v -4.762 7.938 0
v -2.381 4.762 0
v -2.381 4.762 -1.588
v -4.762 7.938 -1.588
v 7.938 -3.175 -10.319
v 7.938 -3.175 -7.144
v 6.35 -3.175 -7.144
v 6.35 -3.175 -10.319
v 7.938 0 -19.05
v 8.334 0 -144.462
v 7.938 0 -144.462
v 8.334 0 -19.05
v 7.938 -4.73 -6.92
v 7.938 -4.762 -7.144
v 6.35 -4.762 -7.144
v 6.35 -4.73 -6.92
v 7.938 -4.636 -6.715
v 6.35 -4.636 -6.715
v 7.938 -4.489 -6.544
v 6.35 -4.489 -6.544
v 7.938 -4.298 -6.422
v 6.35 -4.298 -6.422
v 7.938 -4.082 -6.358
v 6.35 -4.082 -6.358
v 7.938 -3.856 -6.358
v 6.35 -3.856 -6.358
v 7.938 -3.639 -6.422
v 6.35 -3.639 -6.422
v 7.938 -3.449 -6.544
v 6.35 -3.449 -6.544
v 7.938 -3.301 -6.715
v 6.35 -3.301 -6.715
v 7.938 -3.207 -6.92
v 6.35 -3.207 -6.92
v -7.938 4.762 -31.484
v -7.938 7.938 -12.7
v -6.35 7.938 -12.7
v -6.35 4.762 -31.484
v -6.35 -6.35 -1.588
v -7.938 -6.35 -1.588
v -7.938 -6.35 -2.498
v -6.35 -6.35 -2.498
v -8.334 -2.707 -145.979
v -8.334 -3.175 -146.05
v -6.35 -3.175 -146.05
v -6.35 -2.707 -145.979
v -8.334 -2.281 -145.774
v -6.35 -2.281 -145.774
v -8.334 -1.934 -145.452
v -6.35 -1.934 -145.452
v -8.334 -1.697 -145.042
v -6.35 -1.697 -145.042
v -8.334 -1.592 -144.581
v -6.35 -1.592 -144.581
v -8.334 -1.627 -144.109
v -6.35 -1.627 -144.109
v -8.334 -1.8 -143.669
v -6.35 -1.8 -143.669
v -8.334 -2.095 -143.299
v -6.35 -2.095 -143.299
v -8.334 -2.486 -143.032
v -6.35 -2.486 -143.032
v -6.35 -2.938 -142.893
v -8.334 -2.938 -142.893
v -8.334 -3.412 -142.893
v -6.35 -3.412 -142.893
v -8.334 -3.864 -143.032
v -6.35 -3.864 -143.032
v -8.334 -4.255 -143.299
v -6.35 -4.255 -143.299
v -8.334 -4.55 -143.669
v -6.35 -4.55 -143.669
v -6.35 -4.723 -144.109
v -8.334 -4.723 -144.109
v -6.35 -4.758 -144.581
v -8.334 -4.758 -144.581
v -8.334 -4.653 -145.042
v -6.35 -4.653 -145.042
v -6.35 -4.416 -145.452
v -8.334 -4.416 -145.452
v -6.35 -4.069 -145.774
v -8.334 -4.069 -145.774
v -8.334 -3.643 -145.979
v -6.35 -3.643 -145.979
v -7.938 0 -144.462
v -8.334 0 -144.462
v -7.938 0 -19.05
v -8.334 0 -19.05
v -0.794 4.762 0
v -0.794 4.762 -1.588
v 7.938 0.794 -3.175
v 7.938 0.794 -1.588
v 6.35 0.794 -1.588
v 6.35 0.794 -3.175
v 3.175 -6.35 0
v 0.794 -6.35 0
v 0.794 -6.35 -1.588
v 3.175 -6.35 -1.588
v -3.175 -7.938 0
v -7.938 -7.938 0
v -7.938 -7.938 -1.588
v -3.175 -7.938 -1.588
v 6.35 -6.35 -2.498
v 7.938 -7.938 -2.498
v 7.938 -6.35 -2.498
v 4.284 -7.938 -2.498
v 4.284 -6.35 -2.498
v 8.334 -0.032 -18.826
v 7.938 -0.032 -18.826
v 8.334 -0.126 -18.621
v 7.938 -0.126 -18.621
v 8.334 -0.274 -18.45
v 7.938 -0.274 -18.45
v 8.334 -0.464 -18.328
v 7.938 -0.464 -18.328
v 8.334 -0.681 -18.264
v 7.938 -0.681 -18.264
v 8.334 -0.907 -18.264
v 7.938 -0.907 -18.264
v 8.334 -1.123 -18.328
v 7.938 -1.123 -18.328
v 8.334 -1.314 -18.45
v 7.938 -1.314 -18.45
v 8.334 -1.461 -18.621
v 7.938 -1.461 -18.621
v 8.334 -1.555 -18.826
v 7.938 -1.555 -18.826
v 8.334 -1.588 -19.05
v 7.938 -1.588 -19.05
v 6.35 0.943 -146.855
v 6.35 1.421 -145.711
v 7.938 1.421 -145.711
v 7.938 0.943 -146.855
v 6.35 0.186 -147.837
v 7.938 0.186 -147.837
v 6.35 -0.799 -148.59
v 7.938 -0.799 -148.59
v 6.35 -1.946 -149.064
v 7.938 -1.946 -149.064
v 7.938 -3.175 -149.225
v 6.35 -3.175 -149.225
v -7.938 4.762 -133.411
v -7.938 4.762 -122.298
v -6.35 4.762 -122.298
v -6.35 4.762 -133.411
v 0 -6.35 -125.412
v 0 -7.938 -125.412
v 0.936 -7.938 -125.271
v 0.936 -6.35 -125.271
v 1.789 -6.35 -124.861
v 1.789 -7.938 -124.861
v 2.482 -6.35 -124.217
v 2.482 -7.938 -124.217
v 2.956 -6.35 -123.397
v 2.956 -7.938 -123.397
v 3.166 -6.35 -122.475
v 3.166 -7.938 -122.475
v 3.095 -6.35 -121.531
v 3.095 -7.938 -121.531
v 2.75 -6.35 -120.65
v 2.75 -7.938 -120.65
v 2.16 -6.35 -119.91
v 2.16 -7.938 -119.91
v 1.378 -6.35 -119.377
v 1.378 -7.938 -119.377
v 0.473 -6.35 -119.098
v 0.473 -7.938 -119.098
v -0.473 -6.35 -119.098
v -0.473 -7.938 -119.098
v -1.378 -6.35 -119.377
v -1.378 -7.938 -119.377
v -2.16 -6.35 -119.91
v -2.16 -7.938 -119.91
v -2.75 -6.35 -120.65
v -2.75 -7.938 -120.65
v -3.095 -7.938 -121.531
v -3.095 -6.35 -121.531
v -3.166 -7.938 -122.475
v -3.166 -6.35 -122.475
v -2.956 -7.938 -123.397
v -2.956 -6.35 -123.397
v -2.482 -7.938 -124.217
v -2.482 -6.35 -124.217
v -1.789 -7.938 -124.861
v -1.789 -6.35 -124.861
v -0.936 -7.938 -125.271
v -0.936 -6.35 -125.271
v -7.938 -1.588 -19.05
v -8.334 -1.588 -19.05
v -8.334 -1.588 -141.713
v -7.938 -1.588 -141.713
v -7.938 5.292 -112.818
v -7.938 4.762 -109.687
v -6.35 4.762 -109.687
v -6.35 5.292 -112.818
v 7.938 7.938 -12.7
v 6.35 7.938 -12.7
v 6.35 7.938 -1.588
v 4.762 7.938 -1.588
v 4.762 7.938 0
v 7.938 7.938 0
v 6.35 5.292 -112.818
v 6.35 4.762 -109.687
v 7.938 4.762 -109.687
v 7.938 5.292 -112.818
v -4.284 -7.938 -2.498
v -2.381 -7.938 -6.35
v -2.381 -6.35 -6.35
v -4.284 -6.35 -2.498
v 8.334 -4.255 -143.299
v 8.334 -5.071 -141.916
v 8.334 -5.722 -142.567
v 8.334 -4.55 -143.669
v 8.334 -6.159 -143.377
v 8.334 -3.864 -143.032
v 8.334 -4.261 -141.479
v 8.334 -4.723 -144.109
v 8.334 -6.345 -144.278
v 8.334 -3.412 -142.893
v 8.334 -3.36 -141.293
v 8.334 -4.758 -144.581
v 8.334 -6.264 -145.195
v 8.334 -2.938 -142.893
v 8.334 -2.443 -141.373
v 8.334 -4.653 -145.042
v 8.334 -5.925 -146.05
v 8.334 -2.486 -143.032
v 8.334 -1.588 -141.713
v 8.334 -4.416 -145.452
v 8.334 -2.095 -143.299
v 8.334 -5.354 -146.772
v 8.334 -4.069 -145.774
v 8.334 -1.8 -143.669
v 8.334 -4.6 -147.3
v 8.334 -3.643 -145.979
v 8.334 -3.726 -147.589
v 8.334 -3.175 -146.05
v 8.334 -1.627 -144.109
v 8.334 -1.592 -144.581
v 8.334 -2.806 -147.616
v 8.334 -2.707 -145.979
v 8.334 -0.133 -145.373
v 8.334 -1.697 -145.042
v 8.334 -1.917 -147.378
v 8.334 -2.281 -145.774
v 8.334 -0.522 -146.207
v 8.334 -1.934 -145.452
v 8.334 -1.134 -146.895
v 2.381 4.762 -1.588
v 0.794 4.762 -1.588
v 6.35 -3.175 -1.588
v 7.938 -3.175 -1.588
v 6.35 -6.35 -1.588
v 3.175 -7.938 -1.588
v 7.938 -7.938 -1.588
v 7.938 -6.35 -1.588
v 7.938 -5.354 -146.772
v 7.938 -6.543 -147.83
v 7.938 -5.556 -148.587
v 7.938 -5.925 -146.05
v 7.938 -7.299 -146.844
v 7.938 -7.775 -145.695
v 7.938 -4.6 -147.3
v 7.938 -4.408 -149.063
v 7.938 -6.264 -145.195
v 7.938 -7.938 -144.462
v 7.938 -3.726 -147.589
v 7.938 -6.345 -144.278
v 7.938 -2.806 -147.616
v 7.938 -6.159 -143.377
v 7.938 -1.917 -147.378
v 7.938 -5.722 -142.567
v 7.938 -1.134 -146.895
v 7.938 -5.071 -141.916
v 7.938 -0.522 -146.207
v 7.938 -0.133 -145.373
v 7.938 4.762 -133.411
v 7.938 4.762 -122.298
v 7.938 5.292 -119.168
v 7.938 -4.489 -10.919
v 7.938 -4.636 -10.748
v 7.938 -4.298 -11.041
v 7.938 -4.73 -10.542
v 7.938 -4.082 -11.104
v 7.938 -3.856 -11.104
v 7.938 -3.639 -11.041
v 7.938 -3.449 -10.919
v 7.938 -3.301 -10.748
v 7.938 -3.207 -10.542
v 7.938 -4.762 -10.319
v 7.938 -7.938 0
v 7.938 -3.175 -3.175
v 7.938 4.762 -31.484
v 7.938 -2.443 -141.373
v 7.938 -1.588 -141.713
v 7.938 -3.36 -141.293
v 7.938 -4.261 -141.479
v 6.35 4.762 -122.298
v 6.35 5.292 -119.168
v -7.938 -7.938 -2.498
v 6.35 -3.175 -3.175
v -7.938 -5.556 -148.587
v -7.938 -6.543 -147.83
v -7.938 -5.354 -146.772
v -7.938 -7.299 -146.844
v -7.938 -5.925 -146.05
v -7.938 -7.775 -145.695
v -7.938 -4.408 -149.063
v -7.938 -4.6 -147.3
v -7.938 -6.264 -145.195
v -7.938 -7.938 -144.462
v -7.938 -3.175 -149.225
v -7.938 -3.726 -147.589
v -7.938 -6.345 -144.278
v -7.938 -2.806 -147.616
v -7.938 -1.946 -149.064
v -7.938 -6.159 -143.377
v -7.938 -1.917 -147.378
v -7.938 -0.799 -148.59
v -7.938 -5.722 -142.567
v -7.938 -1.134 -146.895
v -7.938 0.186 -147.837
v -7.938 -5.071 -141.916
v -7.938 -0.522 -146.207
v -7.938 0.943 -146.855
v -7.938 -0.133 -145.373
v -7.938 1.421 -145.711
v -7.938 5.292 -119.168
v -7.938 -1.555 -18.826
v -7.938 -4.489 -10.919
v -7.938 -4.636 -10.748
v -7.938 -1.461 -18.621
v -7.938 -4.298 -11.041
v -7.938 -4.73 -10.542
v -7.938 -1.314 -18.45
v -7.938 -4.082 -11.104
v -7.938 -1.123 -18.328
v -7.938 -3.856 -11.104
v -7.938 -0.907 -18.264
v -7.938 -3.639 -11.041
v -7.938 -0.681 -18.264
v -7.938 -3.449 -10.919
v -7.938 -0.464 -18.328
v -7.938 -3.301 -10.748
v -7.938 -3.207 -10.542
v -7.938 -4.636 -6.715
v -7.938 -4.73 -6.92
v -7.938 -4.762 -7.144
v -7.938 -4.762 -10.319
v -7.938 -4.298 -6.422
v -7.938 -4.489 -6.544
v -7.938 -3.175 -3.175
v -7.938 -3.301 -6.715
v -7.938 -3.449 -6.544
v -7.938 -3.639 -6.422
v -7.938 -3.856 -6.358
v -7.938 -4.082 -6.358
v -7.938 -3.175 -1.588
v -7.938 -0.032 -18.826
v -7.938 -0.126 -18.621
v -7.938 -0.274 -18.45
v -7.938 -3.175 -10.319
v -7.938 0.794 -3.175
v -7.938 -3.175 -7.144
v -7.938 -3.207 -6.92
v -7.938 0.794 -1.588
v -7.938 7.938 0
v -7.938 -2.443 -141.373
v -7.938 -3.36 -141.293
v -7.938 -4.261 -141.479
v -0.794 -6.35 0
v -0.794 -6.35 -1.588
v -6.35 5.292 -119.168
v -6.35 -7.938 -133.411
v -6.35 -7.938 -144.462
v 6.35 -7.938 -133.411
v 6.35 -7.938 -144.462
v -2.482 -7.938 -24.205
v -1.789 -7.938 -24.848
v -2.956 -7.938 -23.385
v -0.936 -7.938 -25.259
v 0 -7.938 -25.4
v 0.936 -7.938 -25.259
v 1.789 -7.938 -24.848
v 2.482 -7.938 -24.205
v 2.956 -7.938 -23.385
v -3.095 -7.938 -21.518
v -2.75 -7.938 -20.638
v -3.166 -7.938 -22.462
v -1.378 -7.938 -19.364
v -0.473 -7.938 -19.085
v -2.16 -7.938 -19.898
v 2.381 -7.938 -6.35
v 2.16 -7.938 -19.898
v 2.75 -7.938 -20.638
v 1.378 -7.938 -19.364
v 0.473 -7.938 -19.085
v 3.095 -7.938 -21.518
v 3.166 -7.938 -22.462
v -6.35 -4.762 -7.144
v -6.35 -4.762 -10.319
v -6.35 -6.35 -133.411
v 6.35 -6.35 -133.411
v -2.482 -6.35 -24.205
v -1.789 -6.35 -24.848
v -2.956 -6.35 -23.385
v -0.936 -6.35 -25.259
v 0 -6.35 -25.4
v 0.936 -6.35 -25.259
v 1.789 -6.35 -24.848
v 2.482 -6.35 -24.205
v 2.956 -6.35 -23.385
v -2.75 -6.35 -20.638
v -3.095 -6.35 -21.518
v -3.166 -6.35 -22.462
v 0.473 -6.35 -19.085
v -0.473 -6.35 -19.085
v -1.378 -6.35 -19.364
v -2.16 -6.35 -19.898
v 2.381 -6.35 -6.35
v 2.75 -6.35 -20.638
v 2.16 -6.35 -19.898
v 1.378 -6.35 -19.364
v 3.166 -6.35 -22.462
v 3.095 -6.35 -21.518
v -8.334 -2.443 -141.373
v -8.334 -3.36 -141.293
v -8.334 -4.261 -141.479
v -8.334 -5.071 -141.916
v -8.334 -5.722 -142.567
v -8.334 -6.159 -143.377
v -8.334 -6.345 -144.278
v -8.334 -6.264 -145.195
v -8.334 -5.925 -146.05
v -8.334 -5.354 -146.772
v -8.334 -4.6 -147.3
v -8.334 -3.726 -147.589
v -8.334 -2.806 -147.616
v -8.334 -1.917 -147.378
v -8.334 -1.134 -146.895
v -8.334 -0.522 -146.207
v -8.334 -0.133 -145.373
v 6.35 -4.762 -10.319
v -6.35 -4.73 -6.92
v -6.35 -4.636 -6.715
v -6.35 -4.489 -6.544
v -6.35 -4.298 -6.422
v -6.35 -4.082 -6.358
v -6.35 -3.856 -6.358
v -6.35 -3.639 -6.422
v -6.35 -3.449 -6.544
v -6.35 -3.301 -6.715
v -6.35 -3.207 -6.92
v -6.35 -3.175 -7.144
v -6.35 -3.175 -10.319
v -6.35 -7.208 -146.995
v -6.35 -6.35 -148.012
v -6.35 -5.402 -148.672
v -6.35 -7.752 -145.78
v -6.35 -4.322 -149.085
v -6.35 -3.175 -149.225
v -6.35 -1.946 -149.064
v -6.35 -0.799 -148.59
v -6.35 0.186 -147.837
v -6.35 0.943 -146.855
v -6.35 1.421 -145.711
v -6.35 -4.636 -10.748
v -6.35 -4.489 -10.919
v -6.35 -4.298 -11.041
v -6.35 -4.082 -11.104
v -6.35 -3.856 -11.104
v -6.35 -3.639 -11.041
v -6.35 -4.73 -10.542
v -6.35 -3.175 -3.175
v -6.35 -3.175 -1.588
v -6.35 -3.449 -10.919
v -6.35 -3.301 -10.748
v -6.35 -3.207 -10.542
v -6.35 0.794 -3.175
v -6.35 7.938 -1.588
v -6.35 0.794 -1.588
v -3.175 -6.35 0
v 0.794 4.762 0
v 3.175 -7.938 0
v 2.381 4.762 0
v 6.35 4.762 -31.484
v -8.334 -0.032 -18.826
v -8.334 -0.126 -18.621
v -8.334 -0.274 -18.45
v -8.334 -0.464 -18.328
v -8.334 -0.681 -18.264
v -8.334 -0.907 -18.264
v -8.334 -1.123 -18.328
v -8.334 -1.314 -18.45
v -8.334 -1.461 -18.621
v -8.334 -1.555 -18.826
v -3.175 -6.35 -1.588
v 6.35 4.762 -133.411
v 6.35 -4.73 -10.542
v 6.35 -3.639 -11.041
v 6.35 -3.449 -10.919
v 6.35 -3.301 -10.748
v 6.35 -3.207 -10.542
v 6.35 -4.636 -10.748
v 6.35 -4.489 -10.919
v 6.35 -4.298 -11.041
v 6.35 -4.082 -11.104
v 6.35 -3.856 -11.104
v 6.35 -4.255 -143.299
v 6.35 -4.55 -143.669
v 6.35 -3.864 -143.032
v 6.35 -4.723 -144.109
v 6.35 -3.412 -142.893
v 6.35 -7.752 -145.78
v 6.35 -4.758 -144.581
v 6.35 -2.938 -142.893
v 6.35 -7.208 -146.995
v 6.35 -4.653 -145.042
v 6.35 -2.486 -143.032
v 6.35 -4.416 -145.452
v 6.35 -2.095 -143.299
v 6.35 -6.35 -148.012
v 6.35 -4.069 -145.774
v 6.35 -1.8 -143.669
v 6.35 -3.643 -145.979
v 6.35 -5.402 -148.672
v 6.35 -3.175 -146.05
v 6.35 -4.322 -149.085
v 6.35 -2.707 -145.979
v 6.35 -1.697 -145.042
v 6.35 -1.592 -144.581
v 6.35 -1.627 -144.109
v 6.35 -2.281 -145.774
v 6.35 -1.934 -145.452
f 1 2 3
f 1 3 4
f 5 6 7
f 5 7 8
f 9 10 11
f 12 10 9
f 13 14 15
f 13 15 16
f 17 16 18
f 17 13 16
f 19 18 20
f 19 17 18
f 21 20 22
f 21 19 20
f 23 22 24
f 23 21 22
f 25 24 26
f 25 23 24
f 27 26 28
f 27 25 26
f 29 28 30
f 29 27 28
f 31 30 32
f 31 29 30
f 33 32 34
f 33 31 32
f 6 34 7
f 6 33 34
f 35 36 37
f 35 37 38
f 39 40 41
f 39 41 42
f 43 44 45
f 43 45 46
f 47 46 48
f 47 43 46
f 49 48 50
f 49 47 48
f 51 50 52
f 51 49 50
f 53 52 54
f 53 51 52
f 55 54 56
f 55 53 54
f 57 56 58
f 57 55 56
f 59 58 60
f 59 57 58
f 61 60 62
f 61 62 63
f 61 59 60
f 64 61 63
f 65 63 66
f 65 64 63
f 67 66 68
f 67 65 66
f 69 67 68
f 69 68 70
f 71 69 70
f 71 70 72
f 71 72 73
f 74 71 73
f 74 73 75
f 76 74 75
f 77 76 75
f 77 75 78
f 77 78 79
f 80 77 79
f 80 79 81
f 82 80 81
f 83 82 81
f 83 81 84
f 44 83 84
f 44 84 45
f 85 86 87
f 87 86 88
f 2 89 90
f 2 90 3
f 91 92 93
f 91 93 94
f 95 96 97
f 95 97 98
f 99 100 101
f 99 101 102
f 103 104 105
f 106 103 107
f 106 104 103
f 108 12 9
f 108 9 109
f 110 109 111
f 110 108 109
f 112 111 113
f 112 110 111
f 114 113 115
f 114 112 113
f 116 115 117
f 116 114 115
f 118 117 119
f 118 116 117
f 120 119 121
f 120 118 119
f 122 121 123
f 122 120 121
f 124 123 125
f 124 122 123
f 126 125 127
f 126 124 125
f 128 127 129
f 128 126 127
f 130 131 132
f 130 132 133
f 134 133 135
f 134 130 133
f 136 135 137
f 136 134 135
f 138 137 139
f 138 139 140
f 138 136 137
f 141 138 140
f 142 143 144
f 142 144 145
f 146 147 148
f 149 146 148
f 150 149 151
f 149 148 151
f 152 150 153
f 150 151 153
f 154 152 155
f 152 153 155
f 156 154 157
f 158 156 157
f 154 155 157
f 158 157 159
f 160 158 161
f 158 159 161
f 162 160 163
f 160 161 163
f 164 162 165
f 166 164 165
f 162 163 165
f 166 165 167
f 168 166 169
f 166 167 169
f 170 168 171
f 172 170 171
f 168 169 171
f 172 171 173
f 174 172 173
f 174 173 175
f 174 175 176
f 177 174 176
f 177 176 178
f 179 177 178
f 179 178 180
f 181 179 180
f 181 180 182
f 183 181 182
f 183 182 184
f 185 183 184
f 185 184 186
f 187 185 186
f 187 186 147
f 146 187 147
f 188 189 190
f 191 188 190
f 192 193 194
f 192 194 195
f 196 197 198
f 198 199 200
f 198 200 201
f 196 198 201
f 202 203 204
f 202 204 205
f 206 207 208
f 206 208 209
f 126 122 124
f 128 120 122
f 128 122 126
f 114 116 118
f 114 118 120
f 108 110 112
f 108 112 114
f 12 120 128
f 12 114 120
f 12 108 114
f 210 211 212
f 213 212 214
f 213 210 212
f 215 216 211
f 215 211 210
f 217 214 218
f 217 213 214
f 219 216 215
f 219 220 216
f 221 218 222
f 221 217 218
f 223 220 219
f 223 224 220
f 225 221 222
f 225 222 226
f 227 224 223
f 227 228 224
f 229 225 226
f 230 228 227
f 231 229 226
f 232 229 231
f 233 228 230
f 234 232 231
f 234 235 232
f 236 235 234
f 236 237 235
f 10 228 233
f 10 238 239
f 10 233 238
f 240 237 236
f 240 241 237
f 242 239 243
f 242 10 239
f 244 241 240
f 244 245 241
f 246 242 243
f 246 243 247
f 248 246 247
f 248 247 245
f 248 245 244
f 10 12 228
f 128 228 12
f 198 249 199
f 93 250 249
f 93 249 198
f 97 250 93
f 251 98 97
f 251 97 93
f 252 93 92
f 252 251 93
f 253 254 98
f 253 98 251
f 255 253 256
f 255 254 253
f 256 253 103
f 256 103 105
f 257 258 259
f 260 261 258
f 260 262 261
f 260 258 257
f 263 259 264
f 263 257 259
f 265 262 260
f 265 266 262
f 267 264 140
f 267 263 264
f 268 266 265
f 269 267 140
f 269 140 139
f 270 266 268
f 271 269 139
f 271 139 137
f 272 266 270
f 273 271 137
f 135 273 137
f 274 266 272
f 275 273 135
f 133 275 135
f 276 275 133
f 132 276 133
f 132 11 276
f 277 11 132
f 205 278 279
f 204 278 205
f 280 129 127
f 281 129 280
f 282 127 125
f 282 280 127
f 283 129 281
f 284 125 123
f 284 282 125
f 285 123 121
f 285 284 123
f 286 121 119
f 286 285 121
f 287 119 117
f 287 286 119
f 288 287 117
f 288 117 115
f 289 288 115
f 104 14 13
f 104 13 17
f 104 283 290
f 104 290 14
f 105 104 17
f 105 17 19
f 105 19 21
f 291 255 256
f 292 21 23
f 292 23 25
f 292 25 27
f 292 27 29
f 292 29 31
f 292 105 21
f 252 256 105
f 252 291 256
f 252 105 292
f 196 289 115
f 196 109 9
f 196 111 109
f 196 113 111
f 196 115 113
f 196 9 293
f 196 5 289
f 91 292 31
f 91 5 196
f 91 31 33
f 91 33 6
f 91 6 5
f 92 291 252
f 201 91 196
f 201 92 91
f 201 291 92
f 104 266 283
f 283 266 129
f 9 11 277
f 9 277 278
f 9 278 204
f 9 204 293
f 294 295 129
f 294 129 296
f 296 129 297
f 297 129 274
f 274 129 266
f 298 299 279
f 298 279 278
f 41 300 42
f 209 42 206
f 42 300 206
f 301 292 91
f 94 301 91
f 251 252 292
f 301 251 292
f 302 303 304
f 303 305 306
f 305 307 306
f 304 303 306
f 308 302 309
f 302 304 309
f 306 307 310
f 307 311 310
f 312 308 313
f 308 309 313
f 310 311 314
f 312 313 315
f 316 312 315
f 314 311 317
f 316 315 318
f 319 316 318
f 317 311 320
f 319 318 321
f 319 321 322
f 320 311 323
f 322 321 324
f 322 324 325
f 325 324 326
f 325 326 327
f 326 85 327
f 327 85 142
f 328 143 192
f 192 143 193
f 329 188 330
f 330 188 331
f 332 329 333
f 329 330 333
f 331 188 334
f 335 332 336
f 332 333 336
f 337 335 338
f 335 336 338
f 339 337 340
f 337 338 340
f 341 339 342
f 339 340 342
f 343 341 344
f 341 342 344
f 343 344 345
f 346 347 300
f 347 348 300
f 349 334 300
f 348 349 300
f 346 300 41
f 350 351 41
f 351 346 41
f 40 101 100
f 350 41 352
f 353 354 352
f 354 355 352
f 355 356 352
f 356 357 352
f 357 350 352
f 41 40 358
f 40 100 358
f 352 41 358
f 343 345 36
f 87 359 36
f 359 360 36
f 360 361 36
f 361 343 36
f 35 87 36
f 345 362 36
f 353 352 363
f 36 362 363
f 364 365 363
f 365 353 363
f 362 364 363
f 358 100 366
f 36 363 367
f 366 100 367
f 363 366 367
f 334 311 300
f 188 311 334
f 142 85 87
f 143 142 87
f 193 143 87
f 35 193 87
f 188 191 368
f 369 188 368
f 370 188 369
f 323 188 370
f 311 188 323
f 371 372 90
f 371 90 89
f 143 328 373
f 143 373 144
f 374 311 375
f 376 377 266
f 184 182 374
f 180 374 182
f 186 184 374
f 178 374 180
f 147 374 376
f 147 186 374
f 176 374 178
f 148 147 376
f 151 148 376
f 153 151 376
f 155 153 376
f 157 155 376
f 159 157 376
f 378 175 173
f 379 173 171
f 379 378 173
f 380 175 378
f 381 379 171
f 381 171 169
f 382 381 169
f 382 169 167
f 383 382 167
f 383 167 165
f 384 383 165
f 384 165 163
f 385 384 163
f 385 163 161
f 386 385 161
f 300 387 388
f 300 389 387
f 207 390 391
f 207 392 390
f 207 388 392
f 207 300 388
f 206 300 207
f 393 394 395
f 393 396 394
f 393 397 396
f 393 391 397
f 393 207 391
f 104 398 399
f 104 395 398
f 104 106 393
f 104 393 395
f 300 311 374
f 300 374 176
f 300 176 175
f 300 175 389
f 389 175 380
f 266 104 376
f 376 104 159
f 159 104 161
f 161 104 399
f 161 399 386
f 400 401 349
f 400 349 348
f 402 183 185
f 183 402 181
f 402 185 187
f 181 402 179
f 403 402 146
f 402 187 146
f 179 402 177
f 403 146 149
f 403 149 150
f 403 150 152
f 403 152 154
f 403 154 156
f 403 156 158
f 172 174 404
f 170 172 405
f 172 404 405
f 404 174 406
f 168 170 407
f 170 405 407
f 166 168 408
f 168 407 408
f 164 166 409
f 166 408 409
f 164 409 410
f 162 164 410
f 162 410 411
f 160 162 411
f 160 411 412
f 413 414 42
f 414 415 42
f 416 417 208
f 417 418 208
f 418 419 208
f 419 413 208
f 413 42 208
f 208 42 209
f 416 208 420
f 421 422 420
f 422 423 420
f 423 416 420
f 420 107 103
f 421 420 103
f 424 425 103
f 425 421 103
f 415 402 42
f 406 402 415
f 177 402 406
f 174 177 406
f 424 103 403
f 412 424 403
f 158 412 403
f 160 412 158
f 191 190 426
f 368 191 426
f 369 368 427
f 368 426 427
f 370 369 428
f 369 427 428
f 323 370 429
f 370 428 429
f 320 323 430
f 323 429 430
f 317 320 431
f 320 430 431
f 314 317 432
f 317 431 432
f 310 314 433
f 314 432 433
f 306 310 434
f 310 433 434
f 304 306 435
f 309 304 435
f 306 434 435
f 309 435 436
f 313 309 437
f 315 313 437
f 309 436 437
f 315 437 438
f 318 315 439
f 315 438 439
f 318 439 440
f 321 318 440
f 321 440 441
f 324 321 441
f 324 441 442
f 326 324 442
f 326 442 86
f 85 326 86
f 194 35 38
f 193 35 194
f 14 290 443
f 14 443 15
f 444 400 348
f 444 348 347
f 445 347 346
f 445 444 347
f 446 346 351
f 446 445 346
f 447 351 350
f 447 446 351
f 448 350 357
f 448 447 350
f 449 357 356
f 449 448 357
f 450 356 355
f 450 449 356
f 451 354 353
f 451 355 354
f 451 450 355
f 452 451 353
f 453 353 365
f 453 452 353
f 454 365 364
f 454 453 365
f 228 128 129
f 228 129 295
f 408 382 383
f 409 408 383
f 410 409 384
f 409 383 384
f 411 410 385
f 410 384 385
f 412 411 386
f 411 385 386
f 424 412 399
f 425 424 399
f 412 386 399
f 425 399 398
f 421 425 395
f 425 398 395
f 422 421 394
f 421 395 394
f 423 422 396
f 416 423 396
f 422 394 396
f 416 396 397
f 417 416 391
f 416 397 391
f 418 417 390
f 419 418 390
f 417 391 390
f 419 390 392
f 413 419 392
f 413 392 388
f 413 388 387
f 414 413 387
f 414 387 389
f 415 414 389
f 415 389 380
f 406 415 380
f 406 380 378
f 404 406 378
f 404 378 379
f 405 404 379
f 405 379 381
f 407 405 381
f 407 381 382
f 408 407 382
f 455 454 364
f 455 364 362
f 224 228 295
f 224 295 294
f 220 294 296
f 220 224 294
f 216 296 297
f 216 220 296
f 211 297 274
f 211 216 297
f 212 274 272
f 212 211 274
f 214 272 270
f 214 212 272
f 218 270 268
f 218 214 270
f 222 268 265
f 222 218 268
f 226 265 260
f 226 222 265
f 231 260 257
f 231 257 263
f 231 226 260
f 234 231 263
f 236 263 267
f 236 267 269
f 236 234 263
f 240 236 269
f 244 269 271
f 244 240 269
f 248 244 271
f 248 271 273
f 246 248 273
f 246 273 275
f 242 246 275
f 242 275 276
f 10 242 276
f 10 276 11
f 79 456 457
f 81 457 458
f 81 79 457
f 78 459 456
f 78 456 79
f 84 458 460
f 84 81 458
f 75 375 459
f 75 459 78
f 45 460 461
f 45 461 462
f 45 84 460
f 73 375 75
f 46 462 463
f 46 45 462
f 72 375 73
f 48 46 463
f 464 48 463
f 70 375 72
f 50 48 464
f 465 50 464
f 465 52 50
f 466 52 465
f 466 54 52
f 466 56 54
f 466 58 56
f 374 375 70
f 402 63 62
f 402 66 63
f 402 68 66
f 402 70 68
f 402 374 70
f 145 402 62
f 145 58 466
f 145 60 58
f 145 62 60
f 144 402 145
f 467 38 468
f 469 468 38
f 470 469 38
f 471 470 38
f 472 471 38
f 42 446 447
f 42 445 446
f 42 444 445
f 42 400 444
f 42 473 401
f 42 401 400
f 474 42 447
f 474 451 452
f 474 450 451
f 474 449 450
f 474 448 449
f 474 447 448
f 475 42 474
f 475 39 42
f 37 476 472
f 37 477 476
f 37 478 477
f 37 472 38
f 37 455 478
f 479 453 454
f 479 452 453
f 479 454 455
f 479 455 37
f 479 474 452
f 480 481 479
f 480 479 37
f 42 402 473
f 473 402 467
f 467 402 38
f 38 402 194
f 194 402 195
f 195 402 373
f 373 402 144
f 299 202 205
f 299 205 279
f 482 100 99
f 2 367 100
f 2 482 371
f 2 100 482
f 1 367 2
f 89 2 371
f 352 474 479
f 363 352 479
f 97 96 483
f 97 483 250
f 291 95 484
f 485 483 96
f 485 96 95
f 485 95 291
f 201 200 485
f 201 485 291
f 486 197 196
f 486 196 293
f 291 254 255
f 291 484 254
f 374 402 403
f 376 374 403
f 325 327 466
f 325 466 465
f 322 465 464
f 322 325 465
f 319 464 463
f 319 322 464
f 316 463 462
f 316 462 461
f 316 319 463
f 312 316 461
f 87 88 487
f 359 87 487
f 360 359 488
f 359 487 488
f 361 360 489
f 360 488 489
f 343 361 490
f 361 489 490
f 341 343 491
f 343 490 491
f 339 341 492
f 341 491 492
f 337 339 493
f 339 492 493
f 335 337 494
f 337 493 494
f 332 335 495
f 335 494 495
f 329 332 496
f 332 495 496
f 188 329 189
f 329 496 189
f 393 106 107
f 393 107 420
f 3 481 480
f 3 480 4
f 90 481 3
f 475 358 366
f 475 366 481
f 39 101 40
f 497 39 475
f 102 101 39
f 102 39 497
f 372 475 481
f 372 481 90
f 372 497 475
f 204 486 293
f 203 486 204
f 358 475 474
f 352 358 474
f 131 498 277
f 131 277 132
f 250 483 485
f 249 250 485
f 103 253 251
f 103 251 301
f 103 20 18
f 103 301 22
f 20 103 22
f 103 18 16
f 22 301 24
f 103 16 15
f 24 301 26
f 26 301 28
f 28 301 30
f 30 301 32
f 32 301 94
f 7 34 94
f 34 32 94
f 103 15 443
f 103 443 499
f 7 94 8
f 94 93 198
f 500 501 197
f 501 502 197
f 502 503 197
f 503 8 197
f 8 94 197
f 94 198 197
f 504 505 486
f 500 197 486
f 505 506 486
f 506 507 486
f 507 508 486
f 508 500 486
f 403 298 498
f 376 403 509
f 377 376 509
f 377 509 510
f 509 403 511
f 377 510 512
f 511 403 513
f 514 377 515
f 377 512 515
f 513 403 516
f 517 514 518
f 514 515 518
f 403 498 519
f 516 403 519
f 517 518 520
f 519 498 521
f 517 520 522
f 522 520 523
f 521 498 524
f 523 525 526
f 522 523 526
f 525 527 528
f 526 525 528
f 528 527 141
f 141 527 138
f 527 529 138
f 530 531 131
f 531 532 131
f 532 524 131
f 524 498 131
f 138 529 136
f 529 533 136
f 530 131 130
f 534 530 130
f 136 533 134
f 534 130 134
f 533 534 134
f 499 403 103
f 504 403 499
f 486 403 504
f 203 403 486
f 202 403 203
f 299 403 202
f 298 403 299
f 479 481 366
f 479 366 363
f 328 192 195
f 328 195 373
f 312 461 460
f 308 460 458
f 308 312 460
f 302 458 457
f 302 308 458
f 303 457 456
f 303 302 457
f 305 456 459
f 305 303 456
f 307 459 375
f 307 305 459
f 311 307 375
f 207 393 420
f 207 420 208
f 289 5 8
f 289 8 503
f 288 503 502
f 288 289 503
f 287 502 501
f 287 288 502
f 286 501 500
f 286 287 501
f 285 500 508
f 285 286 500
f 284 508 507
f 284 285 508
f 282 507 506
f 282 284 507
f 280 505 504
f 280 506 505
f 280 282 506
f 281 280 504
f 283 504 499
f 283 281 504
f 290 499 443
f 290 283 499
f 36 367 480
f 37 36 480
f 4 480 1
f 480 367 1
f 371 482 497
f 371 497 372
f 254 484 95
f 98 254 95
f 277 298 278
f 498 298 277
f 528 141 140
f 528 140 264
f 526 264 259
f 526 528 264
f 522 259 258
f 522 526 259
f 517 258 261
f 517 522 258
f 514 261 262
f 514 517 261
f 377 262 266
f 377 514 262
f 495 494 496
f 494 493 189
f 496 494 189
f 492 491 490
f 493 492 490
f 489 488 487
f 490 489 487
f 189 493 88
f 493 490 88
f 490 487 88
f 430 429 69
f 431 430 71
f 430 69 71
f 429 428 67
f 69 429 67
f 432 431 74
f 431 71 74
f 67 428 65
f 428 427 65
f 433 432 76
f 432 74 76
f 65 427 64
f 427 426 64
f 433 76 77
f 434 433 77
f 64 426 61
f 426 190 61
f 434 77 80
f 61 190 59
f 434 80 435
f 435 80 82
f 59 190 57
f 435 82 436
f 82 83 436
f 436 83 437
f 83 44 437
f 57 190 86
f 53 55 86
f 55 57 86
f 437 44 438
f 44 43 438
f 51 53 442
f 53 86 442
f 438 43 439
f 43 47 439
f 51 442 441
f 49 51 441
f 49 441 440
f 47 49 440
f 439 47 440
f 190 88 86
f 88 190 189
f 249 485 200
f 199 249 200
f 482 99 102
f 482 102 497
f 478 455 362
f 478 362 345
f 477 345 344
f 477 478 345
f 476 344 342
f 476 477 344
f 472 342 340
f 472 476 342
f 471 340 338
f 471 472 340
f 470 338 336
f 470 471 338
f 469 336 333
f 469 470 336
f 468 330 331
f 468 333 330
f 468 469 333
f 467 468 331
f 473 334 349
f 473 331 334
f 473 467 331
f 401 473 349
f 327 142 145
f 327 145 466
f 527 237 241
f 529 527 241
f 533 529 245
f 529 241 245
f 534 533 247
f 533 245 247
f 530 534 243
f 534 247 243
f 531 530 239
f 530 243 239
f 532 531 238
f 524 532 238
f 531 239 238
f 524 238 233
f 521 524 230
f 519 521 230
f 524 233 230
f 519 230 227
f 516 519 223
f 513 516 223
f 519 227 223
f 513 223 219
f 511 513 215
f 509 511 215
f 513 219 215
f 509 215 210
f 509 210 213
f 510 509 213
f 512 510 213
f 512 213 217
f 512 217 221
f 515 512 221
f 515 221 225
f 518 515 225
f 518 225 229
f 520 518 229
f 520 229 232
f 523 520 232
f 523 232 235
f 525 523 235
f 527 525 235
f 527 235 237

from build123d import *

# Parameters (mm, degrees)
SKETCH1_W               = 15.875
SKETCH1_H               = 15.875
BOSS_EXTRUDE1_DEPTH     = 149.225
CUT_EXTRUDE1_DEPTH      = 151.276811772
CUT_EXTRUDE1_DEPTH_BACK = 151.276811772
CUT_EXTRUDE2_START      = -1.5875
SKETCH4_W               = 12.7
SKETCH4_H               = 14.2875
CUT_EXTRUDE2_DEPTH      = 149.225
CUT_EXTRUDE4_DEPTH      = 151.276811772
SKETCH6_W               = 6.35
SKETCH6_H               = 1.5875
CUT_EXTRUDE5_DEPTH      = 1.5875
SKETCH7_W               = 1.5875
SKETCH7_H               = 0.910155424
CUT_EXTRUDE6_DEPTH      = 1.5875
SKETCH8_R               = 1.5875
SKETCH8_W               = 1.5875
SKETCH8_H               = 3.96875
CUT_EXTRUDE7_DEPTH      = 151.276811772
SKETCH9_R               = 3.175
CUT_EXTRUDE8_DEPTH      = 151.276811772
BOSS_EXTRUDE2_START     = 0.396875
SKETCH10_R              = 1.5875
BOSS_EXTRUDE2_DEPTH     = 0.396875
SKETCH11_W              = 12.7
SKETCH11_H              = 14.601302857
CUT_EXTRUDE9_DEPTH      = 2.54


with BuildPart() as part:
    # Sketch1 → Boss-Extrude1 (new body)
    with BuildSketch(Plane.XY):
        Rectangle(SKETCH1_W, SKETCH1_H)
    extrude(amount=-BOSS_EXTRUDE1_DEPTH)

    # Sketch2 → Cut-Extrude1 (cut, two sides: drawn at the far end of the back side and taken through both)
    with BuildSketch(Plane(origin=(7.9375, 0, 0), x_dir=(0, 0, -1), z_dir=(1, 0, 0)).offset(-CUT_EXTRUDE1_DEPTH_BACK)):
        with BuildLine():
            Line((149.225, 7.9375), (12.7, 7.9375))
            Line((12.7, 7.9375), (31.483553311, 4.7625))
            Line((31.483553311, 4.7625), (109.68727062, 4.7625))
            Line((109.68727062, 4.7625), (112.817862839, 5.291666667))
            Line((112.817862839, 5.291666667), (119.167862839, 5.291666667))
            Line((119.167862839, 5.291666667), (122.298455057, 4.7625))
            Line((122.298455057, 4.7625), (133.410955057, 4.7625))
            Line((133.410955057, 4.7625), (145.71107606, 1.420918197))
            ThreePointArc((145.71107606, 1.420918197), (148.245868191, -0.282331443), (149.225, -3.175))
            Line((149.225, -3.175), (149.225, 7.9375))
        make_face()
        with BuildLine():
            Line((149.225, -7.9375), (149.225, -3.175))
            ThreePointArc((149.225, -3.175), (147.830096045, -6.542596045), (144.4625, -7.9375))
            Line((144.4625, -7.9375), (149.225, -7.9375))
        make_face()
    extrude(amount=CUT_EXTRUDE1_DEPTH + CUT_EXTRUDE1_DEPTH_BACK, mode=Mode.SUBTRACT)

    # Sketch4 → Cut-Extrude2 (cut)
    with BuildSketch(Plane.XY.offset(CUT_EXTRUDE2_START)):
        with Locations((0, 0.79375)):
            Rectangle(SKETCH4_W, SKETCH4_H)
    extrude(amount=-CUT_EXTRUDE2_DEPTH, mode=Mode.SUBTRACT)

    # Sketch5 → Cut-Extrude4 (cut, through all)
    with BuildSketch(Plane.XZ.offset(7.9375)):
        Polygon((2.38125, -6.35), (-2.38125, -6.35), (-4.283584011, -2.497655424), (-6.35, -2.497655424), (-6.35, -1.5875), (-0.79375, -1.5875), (-0.79375, 0), (0.79375, 0), (0.79375, -1.5875), (6.35, -1.5875), (6.35, -2.497655424), (4.283584011, -2.497655424), align=None)
    extrude(amount=-CUT_EXTRUDE4_DEPTH, mode=Mode.SUBTRACT)

    # Sketch6 → Cut-Extrude5 (cut)
    with BuildSketch(Plane.XY):
        Polygon((0.79375, 4.7625), (2.38125, 4.7625), (4.7625, 7.9375), (0.79375, 7.9375), align=None)
        Polygon((-0.79375, 4.7625), (-2.38125, 4.7625), (-4.7625, 7.9375), (-0.79375, 7.9375), align=None)
        with Locations((0, -7.14375)):
            Rectangle(SKETCH6_W, SKETCH6_H)
    extrude(amount=-CUT_EXTRUDE5_DEPTH, mode=Mode.SUBTRACT)

    # Sketch7 → Cut-Extrude6 (cut)
    with BuildSketch(Plane.XZ.offset(7.9375)):
        with Locations((7.14375, -2.042577712)):
            Rectangle(SKETCH7_W, SKETCH7_H)
        with Locations((-7.14375, -2.042577712)):
            Rectangle(SKETCH7_W, SKETCH7_H)
    extrude(amount=-CUT_EXTRUDE6_DEPTH, mode=Mode.SUBTRACT)

    # Sketch8 → Cut-Extrude7 (cut, through all)
    with BuildSketch(Plane(origin=(7.9375, 0, 0), x_dir=(0, 0, -1), z_dir=(1, 0, 0))):
        with Locations((144.4625, -3.175)):
            Circle(SKETCH8_R)
        with Locations((2.38125, -1.190625)):
            Rectangle(SKETCH8_W, SKETCH8_H)
        with BuildLine():
            Line((7.14375, -3.175), (10.31875, -3.175))
            ThreePointArc((10.31875, -3.175), (11.1125, -3.96875), (10.31875, -4.7625))
            Line((10.31875, -4.7625), (7.14375, -4.7625))
            ThreePointArc((7.14375, -4.7625), (6.35, -3.96875), (7.14375, -3.175))
        make_face()
    extrude(amount=-CUT_EXTRUDE7_DEPTH, mode=Mode.SUBTRACT)

    # Sketch9 → Cut-Extrude8 (cut, through all)
    with BuildSketch(Plane.XZ.offset(7.9375)):
        with Locations(Location((0, -22.225, 0), (0, 0, 270))):
            Circle(SKETCH9_R)
        with Locations(Location((0, -122.2375, 0), (0, 0, 270))):
            Circle(SKETCH9_R)
    extrude(amount=-CUT_EXTRUDE8_DEPTH, mode=Mode.SUBTRACT)

    # Sketch10 → Boss-Extrude2 (add)
    with BuildSketch(Plane(origin=(7.9375, 0, 0), x_dir=(0, 0, -1), z_dir=(1, 0, 0)).offset(BOSS_EXTRUDE2_START)):
        with BuildLine():
            Line((144.4625, 0), (19.05, 0))
            ThreePointArc((19.05, 0), (18.25625, -0.79375), (19.05, -1.5875))
            Line((19.05, -1.5875), (141.712869343, -1.5875))
            ThreePointArc((141.712869343, -1.5875), (146.05, -5.924630657), (144.4625, 0))
        make_face()
        with Locations((144.4625, -3.175)):
            Circle(SKETCH10_R, mode=Mode.SUBTRACT)
    boss_extrude2 = extrude(amount=-BOSS_EXTRUDE2_DEPTH)

    # Mirror1: Boss-Extrude2 across plane
    add(boss_extrude2.mirror(Plane(origin=(0, 0, 0), x_dir=(0, 0, 1), z_dir=(1, 0, 0))))

    # Sketch11 → Cut-Extrude9 (cut)
    with BuildSketch(Plane(origin=(0, -6.35, 0), x_dir=(1, 0, 0), z_dir=(0, 1, 0))):
        with Locations((0, 140.711606485)):
            Rectangle(SKETCH11_W, SKETCH11_H)
    extrude(amount=-CUT_EXTRUDE9_DEPTH, mode=Mode.SUBTRACT)


solid = part.part
